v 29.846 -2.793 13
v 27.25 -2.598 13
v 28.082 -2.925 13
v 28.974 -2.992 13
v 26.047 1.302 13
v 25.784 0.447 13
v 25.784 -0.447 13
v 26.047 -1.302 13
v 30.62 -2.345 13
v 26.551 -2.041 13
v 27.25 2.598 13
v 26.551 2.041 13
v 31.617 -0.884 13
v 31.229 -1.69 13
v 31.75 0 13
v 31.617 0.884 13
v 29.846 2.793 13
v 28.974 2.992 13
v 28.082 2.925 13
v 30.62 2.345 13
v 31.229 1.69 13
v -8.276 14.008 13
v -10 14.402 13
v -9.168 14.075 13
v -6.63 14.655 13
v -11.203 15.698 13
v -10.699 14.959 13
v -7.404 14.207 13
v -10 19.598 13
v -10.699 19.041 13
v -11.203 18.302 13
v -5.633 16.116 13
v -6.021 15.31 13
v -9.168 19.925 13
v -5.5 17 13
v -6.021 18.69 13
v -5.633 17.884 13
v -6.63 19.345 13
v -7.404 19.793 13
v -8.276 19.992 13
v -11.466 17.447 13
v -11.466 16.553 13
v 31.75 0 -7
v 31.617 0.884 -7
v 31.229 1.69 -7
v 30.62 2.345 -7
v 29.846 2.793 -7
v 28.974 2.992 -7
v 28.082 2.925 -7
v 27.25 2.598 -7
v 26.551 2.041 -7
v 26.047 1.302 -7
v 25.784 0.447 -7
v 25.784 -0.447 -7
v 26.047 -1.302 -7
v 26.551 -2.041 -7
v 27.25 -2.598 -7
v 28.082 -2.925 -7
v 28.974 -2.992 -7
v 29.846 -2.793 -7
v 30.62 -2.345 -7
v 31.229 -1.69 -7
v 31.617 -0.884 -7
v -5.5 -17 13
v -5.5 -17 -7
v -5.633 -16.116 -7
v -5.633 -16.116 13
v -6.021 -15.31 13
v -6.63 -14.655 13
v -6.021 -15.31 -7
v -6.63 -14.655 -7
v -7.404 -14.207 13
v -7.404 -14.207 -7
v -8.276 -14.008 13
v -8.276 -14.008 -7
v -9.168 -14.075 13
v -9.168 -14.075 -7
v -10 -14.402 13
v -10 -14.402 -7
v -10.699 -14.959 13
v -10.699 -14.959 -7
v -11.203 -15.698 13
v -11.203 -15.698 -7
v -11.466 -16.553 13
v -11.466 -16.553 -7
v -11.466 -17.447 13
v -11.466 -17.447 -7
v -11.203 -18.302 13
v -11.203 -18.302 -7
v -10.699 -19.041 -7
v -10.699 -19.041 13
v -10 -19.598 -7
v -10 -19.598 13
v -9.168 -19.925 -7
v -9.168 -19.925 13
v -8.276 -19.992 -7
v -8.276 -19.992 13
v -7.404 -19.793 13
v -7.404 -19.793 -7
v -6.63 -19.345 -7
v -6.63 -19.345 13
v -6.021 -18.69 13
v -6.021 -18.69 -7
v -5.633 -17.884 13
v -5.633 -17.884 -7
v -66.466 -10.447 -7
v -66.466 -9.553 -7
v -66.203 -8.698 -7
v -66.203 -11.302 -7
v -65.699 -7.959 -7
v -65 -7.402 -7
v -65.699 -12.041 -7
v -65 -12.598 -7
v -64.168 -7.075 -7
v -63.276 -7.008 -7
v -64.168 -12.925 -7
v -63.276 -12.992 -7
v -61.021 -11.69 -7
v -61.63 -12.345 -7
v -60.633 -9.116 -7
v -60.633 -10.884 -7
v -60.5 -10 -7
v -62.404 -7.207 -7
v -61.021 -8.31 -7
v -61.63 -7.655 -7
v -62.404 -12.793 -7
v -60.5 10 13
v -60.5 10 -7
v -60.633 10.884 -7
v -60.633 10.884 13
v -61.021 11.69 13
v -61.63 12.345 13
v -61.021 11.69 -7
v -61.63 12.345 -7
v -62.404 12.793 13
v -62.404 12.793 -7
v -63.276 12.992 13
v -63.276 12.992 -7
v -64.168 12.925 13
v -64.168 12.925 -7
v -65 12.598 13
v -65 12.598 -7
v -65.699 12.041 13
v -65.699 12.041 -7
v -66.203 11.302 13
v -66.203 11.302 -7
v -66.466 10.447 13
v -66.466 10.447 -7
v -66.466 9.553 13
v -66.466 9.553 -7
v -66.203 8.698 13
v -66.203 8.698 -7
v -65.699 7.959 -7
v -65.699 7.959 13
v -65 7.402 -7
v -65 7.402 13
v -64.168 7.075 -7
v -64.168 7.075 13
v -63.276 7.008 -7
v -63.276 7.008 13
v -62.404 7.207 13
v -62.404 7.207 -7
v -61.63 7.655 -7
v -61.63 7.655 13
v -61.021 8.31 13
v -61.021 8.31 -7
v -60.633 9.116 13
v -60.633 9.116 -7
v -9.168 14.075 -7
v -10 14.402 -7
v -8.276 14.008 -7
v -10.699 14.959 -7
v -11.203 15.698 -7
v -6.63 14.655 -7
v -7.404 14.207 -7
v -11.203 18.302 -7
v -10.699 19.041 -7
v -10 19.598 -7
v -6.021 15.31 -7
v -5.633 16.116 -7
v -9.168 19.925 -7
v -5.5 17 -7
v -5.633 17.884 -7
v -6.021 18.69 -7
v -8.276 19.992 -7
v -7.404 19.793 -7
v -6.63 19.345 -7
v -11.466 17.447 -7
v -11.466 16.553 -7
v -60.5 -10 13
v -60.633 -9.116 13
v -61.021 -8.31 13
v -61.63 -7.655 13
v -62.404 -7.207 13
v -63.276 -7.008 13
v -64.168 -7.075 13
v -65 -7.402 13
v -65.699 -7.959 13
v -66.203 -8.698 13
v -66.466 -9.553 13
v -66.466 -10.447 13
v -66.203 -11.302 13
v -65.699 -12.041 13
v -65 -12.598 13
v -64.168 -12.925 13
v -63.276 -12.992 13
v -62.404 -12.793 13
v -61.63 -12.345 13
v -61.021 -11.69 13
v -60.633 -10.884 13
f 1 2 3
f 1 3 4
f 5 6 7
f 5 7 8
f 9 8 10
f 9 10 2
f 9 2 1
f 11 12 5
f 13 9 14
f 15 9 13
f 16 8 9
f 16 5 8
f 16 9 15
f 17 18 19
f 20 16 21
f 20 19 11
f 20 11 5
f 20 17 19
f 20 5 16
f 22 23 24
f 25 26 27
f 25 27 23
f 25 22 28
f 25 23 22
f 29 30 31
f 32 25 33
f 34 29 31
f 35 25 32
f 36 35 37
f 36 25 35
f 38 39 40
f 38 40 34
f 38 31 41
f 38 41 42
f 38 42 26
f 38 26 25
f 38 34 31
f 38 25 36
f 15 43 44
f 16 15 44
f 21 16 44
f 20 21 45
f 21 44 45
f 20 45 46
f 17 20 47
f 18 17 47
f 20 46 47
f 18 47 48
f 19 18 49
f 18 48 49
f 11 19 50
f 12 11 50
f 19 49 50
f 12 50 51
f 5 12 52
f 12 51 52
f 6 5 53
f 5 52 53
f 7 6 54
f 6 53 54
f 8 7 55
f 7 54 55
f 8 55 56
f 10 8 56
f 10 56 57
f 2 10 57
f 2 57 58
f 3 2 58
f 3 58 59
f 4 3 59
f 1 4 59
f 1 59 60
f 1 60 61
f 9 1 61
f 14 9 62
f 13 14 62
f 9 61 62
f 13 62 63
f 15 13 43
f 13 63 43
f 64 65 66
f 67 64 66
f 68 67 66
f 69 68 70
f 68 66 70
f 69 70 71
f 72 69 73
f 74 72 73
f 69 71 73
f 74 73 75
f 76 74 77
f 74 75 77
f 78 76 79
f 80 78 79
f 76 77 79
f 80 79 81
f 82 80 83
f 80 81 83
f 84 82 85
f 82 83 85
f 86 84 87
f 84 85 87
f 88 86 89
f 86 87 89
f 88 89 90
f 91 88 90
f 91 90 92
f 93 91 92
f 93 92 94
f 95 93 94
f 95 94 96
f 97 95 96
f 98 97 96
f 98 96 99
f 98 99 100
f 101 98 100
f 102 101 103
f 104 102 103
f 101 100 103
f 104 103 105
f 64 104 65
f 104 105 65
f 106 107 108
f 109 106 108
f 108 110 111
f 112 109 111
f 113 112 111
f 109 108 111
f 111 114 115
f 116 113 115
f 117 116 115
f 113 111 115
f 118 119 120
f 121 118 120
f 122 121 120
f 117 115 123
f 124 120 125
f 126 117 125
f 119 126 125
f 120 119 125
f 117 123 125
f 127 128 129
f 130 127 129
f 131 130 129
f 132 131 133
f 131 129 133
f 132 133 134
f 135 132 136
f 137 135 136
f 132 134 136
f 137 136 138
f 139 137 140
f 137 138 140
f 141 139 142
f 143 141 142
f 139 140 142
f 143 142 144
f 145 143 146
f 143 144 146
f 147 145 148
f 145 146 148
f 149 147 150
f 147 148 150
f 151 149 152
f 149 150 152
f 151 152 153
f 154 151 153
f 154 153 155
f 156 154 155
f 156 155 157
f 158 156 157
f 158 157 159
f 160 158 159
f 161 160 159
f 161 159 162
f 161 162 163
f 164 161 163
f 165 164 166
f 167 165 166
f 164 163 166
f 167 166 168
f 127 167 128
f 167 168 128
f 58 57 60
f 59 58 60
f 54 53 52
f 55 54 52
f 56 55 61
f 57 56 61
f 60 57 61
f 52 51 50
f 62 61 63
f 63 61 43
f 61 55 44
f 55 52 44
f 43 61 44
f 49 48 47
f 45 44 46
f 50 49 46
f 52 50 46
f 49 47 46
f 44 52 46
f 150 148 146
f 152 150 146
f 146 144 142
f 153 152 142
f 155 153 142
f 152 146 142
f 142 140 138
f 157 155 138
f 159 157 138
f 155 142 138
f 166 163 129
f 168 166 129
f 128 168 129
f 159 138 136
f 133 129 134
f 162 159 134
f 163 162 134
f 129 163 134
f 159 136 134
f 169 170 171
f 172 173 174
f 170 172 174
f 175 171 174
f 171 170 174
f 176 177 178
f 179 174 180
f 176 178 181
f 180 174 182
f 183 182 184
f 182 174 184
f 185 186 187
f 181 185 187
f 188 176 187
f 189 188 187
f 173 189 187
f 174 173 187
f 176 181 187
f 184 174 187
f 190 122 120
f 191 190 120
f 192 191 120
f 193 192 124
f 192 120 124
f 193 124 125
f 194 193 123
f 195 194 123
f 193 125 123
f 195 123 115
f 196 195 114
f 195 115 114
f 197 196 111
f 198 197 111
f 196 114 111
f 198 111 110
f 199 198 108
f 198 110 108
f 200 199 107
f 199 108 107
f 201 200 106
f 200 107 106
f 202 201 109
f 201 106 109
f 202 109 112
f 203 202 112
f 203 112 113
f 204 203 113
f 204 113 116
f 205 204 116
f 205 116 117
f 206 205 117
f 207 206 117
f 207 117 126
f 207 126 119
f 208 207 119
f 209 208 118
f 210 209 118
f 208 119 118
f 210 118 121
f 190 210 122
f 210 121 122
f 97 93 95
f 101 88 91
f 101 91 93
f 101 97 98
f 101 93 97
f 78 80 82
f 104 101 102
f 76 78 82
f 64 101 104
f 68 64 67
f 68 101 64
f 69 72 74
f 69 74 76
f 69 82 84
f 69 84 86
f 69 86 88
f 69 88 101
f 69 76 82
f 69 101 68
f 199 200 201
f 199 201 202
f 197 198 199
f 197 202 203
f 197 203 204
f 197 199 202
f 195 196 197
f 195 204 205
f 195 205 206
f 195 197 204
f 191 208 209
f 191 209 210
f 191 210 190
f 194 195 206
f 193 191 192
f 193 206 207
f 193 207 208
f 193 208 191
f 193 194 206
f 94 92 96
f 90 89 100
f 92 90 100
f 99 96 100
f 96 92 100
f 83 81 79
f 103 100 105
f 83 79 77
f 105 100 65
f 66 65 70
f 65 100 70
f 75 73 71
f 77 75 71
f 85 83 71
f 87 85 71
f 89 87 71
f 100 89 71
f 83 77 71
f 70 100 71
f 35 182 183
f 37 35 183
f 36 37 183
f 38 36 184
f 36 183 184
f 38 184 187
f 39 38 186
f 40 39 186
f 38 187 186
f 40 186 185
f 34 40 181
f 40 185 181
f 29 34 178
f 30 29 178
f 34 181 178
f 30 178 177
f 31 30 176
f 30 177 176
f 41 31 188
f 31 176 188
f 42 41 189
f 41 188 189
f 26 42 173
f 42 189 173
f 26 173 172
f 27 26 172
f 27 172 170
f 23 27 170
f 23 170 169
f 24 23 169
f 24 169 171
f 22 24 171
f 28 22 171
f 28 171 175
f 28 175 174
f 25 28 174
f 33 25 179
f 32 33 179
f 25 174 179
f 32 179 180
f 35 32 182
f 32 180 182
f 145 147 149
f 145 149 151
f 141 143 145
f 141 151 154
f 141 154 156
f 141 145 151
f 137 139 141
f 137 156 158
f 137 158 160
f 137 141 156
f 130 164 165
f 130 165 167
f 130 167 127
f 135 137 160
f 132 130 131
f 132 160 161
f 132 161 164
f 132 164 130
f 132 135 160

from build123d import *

# Parameters (mm, degrees)
CYLINDER148_R     = 3
CYLINDER148_DEPTH = 20
CYLINDER149_R     = 3
CYLINDER149_DEPTH = 20
CYLINDER152_R     = 3
CYLINDER152_DEPTH = 20
CYLINDER145_R     = 3
CYLINDER145_DEPTH = 20
CYLINDER155_R     = 3
CYLINDER155_DEPTH = 20


with BuildPart() as zylinder148:
    # Cylinder148 → Cylinder148 (new body)
    with BuildSketch(Plane(origin=(-63.5, -10, -7), x_dir=(1, 0, 0), z_dir=(0, 0, 1))):
        Circle(CYLINDER148_R)
    extrude(amount=CYLINDER148_DEPTH)


with BuildPart() as zylinder149:
    # Cylinder149 → Cylinder149 (new body)
    with BuildSketch(Plane(origin=(-8.5, -17, -7), x_dir=(1, 0, 0), z_dir=(0, 0, 1))):
        Circle(CYLINDER149_R)
    extrude(amount=CYLINDER149_DEPTH)


with BuildPart() as zylinder152:
    # Cylinder152 → Cylinder152 (new body)
    with BuildSketch(Plane(origin=(-63.5, 10, -7), x_dir=(1, 0, 0), z_dir=(0, 0, 1))):
        Circle(CYLINDER152_R)
    extrude(amount=CYLINDER152_DEPTH)


with BuildPart() as zylinder145:
    # Cylinder145 → Cylinder145 (new body)
    with BuildSketch(Plane(origin=(-8.5, 17, -7), x_dir=(1, 0, 0), z_dir=(0, 0, 1))):
        Circle(CYLINDER145_R)
    extrude(amount=CYLINDER145_DEPTH)


with BuildPart() as fusion106:
    # Cylinder155 → Cylinder155 (new body)
    with BuildSketch(Plane(origin=(28.75, 0, -7), x_dir=(1, 0, 0), z_dir=(0, 0, 1))):
        Circle(CYLINDER155_R)
    extrude(amount=CYLINDER155_DEPTH)

    # Fusion106: union Zylinder148, Zylinder149, Zylinder152, Zylinder145
    add(zylinder148.part)
    add(zylinder149.part)
    add(zylinder152.part)
    add(zylinder145.part)


solid = fusion106.part
